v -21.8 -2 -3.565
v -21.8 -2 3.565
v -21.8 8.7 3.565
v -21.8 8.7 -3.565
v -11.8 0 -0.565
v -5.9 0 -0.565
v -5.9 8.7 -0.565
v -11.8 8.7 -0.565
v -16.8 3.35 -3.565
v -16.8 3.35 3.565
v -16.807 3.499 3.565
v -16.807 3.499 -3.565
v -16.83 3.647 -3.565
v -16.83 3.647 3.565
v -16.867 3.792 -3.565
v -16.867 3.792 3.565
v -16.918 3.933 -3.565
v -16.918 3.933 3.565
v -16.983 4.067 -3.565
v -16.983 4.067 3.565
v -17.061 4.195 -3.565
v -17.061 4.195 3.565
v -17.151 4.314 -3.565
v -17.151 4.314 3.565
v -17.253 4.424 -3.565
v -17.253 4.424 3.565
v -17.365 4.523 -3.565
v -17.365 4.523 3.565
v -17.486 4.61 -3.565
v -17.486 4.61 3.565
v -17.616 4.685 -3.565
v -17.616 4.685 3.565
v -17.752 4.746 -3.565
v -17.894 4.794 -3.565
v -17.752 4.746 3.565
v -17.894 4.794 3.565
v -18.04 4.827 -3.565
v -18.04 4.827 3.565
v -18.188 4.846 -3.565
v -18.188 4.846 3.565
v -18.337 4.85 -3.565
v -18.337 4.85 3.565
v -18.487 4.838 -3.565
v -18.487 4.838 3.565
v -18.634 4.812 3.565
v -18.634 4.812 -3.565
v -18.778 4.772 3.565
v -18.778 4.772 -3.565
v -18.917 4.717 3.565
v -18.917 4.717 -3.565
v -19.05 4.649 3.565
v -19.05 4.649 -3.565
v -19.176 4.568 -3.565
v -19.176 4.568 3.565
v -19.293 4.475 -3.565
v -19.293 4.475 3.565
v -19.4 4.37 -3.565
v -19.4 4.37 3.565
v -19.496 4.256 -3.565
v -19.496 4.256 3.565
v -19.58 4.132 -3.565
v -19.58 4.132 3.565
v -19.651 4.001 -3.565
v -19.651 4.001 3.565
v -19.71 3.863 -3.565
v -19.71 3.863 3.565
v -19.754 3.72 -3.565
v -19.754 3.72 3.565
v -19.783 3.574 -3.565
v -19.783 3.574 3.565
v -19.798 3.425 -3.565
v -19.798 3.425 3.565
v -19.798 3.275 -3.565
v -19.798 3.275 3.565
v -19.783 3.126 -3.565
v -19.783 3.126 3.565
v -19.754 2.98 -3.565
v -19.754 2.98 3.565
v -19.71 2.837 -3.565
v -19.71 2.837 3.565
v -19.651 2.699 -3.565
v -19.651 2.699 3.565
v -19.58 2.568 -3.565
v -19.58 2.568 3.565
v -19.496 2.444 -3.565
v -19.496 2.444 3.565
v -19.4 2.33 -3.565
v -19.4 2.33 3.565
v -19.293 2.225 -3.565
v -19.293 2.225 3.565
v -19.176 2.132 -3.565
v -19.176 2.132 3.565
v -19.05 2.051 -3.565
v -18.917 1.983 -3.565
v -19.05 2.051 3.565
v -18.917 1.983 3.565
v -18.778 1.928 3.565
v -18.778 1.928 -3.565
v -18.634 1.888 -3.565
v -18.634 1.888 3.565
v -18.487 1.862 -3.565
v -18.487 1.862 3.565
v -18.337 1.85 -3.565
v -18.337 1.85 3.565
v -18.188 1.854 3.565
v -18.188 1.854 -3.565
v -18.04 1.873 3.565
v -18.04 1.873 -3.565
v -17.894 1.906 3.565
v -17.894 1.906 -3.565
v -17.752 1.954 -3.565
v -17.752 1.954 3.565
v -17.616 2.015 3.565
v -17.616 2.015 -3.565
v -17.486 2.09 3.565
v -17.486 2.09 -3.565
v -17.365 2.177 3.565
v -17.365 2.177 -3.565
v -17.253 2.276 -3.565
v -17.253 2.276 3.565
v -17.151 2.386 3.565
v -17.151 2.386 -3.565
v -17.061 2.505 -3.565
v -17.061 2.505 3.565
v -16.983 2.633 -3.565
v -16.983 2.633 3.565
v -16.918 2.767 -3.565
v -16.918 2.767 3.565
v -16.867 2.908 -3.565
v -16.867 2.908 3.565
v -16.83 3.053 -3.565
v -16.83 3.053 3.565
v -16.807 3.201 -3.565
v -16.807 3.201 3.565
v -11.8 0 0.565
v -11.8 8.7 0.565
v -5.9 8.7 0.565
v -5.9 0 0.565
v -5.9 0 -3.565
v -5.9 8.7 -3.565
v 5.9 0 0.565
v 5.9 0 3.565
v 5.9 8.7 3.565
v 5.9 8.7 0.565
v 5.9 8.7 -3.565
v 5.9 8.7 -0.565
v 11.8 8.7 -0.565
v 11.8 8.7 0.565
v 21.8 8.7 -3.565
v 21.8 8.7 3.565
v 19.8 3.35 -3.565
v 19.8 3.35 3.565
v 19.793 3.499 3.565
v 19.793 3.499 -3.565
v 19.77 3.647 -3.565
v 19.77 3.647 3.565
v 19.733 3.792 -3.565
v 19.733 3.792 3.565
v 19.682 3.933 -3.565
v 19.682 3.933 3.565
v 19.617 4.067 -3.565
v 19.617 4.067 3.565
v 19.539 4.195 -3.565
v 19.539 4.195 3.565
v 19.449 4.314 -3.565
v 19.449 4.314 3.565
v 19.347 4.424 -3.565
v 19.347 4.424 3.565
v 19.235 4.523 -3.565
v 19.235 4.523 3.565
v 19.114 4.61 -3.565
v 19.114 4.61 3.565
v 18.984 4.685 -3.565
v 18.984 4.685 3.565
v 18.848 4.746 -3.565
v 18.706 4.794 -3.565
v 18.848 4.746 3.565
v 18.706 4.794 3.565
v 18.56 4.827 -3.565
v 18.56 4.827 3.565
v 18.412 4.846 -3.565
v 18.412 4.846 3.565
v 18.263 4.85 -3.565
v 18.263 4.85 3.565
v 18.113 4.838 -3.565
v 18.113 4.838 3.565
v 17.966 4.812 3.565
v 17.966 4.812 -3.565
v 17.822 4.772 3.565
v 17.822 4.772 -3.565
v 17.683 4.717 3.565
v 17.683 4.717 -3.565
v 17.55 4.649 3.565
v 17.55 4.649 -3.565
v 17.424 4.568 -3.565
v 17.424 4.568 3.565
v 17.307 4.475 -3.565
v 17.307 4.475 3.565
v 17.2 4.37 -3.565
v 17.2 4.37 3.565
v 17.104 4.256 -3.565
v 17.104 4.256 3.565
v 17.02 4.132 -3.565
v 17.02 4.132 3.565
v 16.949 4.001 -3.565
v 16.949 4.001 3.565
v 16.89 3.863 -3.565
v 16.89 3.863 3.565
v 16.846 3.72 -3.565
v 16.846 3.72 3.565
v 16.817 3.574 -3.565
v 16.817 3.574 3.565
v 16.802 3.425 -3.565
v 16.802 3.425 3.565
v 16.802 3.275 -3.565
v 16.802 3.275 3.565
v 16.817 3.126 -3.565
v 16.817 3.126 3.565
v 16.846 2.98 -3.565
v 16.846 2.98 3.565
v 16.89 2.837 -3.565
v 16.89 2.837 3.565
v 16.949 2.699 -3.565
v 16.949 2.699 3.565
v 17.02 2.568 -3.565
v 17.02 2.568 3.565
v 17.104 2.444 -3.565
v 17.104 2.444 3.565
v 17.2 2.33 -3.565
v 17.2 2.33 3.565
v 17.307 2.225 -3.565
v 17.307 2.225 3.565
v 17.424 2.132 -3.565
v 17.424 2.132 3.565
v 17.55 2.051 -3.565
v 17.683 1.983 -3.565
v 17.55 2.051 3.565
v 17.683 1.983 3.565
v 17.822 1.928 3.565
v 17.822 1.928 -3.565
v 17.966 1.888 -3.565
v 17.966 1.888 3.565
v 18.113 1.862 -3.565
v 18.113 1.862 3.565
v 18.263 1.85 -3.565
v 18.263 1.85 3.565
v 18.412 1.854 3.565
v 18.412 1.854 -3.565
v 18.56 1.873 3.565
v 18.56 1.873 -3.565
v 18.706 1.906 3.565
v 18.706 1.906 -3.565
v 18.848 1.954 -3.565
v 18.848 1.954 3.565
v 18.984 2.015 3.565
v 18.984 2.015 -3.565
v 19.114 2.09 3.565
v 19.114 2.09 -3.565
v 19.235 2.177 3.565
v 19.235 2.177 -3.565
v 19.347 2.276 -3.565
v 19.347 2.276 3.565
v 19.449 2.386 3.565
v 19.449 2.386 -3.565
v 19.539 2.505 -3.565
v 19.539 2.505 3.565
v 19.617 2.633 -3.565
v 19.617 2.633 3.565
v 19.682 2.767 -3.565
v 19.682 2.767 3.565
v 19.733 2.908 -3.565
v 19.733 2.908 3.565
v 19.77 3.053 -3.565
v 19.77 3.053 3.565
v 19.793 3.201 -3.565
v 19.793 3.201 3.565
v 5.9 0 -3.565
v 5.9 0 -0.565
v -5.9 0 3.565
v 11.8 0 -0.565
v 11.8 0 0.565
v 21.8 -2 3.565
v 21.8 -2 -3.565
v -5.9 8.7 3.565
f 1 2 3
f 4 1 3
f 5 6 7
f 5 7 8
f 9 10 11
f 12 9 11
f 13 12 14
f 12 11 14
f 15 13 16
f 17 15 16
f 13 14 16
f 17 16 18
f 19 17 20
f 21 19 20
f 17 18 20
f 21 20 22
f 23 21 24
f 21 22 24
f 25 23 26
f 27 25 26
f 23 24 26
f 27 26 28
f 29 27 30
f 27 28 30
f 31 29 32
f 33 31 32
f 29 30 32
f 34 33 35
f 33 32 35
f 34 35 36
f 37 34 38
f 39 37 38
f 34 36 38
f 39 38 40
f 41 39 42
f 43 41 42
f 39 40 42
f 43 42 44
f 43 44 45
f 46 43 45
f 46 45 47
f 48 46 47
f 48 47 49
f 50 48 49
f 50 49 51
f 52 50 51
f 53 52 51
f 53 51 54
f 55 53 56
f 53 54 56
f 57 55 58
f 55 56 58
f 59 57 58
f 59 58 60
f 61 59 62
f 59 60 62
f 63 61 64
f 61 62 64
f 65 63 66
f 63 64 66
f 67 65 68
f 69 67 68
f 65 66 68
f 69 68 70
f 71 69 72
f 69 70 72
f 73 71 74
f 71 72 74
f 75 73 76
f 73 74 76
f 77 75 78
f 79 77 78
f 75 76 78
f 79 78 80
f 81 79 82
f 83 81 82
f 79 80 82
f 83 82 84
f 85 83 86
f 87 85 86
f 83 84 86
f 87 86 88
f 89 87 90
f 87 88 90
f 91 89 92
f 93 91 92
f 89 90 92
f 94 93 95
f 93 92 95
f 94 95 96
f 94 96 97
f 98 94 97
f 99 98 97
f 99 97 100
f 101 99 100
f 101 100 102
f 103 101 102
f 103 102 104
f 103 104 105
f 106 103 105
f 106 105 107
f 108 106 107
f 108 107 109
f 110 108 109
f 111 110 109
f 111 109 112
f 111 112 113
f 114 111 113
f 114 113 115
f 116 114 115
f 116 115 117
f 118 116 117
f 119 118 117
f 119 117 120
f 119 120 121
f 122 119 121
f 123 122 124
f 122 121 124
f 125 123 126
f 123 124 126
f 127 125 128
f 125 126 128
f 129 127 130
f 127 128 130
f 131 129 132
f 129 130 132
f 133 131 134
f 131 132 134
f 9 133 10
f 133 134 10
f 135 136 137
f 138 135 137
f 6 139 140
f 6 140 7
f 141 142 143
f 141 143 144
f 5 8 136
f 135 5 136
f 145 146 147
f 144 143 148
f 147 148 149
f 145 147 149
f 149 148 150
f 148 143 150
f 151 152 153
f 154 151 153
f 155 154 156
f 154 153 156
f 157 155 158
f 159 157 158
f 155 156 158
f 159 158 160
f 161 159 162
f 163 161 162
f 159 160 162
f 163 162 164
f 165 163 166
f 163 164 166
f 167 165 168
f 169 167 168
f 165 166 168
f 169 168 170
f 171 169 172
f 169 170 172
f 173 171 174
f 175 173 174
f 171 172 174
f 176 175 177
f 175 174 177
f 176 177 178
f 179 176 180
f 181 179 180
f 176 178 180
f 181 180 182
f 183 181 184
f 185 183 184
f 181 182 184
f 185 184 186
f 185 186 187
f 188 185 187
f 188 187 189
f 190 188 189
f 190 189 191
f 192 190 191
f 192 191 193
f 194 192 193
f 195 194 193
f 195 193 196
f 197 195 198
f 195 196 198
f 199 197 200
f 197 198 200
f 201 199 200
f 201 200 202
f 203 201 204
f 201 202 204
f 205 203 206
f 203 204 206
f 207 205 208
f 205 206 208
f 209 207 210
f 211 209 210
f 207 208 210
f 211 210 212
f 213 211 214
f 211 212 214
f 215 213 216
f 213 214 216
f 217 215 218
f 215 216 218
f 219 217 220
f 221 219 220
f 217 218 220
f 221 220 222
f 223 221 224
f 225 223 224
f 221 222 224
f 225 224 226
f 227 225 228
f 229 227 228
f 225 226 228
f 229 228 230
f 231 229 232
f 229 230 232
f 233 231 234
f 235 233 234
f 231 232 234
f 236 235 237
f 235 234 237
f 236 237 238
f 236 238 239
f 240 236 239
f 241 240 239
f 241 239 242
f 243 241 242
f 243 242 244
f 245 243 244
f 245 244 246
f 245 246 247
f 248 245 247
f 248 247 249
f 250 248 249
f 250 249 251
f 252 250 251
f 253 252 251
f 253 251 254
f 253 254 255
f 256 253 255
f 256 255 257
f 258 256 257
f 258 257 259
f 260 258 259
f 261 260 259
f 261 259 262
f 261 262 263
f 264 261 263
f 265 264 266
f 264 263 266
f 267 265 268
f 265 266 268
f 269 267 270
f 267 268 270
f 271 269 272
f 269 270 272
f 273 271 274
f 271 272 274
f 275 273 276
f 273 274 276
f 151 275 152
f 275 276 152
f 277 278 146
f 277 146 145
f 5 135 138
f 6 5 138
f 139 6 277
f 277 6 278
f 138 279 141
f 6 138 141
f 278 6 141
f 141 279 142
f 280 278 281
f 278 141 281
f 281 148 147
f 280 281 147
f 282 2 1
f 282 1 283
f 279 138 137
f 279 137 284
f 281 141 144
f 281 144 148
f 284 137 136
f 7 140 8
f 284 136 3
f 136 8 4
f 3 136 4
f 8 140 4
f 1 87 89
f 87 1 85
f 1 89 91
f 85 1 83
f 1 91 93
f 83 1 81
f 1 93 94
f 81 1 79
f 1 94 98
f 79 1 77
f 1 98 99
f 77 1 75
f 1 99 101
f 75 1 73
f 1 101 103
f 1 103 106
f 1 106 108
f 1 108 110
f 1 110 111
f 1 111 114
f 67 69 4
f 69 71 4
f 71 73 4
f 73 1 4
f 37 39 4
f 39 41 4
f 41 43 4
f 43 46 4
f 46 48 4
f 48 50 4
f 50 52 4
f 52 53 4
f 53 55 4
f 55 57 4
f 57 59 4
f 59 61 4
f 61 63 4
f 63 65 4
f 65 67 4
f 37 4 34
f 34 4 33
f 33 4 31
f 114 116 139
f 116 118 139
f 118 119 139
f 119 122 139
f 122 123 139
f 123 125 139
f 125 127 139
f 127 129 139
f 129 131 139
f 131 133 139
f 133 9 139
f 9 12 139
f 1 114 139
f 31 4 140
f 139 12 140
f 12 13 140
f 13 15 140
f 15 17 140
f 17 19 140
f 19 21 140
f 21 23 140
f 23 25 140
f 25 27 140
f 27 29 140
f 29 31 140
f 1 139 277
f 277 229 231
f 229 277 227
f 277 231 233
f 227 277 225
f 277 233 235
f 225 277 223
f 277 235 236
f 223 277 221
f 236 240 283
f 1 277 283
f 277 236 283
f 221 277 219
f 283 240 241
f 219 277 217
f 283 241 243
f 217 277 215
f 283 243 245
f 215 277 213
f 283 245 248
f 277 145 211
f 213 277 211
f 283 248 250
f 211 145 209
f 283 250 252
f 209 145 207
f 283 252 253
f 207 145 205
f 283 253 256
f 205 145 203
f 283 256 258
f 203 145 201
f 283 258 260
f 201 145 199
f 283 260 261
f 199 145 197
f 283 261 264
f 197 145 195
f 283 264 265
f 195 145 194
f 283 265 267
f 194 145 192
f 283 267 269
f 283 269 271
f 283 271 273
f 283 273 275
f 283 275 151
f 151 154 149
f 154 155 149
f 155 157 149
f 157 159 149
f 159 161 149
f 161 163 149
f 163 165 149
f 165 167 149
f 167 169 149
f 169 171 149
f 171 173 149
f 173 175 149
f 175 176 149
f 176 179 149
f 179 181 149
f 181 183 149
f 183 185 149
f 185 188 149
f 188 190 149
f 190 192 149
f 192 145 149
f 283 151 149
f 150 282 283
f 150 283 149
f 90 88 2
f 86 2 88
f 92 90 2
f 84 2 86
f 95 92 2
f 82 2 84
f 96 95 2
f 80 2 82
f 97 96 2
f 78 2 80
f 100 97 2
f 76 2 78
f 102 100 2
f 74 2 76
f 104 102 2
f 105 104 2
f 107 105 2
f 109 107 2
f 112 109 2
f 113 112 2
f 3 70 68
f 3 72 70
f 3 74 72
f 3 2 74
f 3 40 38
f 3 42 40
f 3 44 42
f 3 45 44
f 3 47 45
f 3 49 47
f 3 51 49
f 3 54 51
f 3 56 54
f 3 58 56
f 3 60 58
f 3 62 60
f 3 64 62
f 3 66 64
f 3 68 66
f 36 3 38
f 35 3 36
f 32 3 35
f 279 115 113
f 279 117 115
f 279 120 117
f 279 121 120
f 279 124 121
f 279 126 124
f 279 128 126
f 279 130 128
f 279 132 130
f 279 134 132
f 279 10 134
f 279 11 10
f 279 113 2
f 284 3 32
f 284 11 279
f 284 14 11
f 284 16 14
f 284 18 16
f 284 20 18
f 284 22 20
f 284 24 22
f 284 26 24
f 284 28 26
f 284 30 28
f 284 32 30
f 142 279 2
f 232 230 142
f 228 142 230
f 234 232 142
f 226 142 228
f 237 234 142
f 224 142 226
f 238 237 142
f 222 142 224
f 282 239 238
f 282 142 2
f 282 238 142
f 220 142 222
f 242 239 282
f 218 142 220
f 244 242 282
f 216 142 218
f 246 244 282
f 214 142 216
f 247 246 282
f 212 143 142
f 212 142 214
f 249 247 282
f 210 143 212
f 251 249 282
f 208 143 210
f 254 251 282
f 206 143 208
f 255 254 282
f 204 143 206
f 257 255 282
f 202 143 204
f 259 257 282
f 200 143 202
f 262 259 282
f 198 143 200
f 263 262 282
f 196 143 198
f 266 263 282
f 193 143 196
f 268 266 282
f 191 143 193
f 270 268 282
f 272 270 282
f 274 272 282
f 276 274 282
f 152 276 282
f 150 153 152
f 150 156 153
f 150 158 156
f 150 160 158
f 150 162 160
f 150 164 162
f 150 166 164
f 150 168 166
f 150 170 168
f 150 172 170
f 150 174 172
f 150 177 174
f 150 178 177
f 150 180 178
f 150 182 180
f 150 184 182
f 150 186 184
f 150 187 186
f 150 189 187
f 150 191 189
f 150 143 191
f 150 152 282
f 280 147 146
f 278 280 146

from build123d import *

# Parameters (mm, degrees)
BOSS_EXTRUDE1_DEPTH   = 8.7
BOSS_EXTRUDE1_2_DEPTH = 8.7
SKETCH3_W             = 29.6
SKETCH3_H             = 7.13
BOSS_EXTRUDE2_DEPTH   = 2
SKETCH4_W             = 7
SKETCH4_H             = 10.7
SKETCH4_R             = 1.5
BOSS_EXTRUDE3_DEPTH   = 7.13


with BuildPart() as part:
    # Sketch2 → Boss-Extrude1 (new body)
    with BuildSketch(Plane(origin=(0, 0, 0), x_dir=(1, 0, 0), z_dir=(0, 1, 0))):
        Polygon((-5.9, 3.565), (-5.9, 0.565), (-11.8, 0.565), (-11.8, -0.565), (-5.9, -0.565), (-5.9, -3.565), (-14.8, -3.565), (-14.8, 3.565), align=None)
    extrude(amount=BOSS_EXTRUDE1_DEPTH)



with BuildPart() as body_2:
    # Sketch2 → Boss-Extrude1 2 (new body)
    with BuildSketch(Plane(origin=(0, 0, 0), x_dir=(1, 0, 0), z_dir=(0, 1, 0))):
        Polygon((5.9, -0.565), (11.8, -0.565), (11.8, 0.565), (5.9, 0.565), (5.9, 3.565), (14.8, 3.565), (14.8, -3.565), (5.9, -3.565), align=None)
    extrude(amount=BOSS_EXTRUDE1_2_DEPTH)


with BuildPart() as part_1:
    add(part.part)

    add(body_2.part)  # Boss-Extrude2 merges body 2
    # Sketch3 → Boss-Extrude2 (add)
    with BuildSketch(Plane.XZ):
        Rectangle(SKETCH3_W, SKETCH3_H)
    extrude(amount=BOSS_EXTRUDE2_DEPTH)

    # Sketch4 → Boss-Extrude3 (add)
    with BuildSketch(Plane.XY.offset(3.565)):
        with Locations((18.3, 3.35)):
            Rectangle(SKETCH4_W, SKETCH4_H)
        with Locations((18.3, 3.35)):
            Circle(SKETCH4_R, mode=Mode.SUBTRACT)
        with Locations((-18.3, 3.35)):
            Rectangle(SKETCH4_W, SKETCH4_H)
        with Locations((-18.3, 3.35)):
            Circle(SKETCH4_R, mode=Mode.SUBTRACT)
    extrude(amount=-BOSS_EXTRUDE3_DEPTH)


solid = part_1.part
